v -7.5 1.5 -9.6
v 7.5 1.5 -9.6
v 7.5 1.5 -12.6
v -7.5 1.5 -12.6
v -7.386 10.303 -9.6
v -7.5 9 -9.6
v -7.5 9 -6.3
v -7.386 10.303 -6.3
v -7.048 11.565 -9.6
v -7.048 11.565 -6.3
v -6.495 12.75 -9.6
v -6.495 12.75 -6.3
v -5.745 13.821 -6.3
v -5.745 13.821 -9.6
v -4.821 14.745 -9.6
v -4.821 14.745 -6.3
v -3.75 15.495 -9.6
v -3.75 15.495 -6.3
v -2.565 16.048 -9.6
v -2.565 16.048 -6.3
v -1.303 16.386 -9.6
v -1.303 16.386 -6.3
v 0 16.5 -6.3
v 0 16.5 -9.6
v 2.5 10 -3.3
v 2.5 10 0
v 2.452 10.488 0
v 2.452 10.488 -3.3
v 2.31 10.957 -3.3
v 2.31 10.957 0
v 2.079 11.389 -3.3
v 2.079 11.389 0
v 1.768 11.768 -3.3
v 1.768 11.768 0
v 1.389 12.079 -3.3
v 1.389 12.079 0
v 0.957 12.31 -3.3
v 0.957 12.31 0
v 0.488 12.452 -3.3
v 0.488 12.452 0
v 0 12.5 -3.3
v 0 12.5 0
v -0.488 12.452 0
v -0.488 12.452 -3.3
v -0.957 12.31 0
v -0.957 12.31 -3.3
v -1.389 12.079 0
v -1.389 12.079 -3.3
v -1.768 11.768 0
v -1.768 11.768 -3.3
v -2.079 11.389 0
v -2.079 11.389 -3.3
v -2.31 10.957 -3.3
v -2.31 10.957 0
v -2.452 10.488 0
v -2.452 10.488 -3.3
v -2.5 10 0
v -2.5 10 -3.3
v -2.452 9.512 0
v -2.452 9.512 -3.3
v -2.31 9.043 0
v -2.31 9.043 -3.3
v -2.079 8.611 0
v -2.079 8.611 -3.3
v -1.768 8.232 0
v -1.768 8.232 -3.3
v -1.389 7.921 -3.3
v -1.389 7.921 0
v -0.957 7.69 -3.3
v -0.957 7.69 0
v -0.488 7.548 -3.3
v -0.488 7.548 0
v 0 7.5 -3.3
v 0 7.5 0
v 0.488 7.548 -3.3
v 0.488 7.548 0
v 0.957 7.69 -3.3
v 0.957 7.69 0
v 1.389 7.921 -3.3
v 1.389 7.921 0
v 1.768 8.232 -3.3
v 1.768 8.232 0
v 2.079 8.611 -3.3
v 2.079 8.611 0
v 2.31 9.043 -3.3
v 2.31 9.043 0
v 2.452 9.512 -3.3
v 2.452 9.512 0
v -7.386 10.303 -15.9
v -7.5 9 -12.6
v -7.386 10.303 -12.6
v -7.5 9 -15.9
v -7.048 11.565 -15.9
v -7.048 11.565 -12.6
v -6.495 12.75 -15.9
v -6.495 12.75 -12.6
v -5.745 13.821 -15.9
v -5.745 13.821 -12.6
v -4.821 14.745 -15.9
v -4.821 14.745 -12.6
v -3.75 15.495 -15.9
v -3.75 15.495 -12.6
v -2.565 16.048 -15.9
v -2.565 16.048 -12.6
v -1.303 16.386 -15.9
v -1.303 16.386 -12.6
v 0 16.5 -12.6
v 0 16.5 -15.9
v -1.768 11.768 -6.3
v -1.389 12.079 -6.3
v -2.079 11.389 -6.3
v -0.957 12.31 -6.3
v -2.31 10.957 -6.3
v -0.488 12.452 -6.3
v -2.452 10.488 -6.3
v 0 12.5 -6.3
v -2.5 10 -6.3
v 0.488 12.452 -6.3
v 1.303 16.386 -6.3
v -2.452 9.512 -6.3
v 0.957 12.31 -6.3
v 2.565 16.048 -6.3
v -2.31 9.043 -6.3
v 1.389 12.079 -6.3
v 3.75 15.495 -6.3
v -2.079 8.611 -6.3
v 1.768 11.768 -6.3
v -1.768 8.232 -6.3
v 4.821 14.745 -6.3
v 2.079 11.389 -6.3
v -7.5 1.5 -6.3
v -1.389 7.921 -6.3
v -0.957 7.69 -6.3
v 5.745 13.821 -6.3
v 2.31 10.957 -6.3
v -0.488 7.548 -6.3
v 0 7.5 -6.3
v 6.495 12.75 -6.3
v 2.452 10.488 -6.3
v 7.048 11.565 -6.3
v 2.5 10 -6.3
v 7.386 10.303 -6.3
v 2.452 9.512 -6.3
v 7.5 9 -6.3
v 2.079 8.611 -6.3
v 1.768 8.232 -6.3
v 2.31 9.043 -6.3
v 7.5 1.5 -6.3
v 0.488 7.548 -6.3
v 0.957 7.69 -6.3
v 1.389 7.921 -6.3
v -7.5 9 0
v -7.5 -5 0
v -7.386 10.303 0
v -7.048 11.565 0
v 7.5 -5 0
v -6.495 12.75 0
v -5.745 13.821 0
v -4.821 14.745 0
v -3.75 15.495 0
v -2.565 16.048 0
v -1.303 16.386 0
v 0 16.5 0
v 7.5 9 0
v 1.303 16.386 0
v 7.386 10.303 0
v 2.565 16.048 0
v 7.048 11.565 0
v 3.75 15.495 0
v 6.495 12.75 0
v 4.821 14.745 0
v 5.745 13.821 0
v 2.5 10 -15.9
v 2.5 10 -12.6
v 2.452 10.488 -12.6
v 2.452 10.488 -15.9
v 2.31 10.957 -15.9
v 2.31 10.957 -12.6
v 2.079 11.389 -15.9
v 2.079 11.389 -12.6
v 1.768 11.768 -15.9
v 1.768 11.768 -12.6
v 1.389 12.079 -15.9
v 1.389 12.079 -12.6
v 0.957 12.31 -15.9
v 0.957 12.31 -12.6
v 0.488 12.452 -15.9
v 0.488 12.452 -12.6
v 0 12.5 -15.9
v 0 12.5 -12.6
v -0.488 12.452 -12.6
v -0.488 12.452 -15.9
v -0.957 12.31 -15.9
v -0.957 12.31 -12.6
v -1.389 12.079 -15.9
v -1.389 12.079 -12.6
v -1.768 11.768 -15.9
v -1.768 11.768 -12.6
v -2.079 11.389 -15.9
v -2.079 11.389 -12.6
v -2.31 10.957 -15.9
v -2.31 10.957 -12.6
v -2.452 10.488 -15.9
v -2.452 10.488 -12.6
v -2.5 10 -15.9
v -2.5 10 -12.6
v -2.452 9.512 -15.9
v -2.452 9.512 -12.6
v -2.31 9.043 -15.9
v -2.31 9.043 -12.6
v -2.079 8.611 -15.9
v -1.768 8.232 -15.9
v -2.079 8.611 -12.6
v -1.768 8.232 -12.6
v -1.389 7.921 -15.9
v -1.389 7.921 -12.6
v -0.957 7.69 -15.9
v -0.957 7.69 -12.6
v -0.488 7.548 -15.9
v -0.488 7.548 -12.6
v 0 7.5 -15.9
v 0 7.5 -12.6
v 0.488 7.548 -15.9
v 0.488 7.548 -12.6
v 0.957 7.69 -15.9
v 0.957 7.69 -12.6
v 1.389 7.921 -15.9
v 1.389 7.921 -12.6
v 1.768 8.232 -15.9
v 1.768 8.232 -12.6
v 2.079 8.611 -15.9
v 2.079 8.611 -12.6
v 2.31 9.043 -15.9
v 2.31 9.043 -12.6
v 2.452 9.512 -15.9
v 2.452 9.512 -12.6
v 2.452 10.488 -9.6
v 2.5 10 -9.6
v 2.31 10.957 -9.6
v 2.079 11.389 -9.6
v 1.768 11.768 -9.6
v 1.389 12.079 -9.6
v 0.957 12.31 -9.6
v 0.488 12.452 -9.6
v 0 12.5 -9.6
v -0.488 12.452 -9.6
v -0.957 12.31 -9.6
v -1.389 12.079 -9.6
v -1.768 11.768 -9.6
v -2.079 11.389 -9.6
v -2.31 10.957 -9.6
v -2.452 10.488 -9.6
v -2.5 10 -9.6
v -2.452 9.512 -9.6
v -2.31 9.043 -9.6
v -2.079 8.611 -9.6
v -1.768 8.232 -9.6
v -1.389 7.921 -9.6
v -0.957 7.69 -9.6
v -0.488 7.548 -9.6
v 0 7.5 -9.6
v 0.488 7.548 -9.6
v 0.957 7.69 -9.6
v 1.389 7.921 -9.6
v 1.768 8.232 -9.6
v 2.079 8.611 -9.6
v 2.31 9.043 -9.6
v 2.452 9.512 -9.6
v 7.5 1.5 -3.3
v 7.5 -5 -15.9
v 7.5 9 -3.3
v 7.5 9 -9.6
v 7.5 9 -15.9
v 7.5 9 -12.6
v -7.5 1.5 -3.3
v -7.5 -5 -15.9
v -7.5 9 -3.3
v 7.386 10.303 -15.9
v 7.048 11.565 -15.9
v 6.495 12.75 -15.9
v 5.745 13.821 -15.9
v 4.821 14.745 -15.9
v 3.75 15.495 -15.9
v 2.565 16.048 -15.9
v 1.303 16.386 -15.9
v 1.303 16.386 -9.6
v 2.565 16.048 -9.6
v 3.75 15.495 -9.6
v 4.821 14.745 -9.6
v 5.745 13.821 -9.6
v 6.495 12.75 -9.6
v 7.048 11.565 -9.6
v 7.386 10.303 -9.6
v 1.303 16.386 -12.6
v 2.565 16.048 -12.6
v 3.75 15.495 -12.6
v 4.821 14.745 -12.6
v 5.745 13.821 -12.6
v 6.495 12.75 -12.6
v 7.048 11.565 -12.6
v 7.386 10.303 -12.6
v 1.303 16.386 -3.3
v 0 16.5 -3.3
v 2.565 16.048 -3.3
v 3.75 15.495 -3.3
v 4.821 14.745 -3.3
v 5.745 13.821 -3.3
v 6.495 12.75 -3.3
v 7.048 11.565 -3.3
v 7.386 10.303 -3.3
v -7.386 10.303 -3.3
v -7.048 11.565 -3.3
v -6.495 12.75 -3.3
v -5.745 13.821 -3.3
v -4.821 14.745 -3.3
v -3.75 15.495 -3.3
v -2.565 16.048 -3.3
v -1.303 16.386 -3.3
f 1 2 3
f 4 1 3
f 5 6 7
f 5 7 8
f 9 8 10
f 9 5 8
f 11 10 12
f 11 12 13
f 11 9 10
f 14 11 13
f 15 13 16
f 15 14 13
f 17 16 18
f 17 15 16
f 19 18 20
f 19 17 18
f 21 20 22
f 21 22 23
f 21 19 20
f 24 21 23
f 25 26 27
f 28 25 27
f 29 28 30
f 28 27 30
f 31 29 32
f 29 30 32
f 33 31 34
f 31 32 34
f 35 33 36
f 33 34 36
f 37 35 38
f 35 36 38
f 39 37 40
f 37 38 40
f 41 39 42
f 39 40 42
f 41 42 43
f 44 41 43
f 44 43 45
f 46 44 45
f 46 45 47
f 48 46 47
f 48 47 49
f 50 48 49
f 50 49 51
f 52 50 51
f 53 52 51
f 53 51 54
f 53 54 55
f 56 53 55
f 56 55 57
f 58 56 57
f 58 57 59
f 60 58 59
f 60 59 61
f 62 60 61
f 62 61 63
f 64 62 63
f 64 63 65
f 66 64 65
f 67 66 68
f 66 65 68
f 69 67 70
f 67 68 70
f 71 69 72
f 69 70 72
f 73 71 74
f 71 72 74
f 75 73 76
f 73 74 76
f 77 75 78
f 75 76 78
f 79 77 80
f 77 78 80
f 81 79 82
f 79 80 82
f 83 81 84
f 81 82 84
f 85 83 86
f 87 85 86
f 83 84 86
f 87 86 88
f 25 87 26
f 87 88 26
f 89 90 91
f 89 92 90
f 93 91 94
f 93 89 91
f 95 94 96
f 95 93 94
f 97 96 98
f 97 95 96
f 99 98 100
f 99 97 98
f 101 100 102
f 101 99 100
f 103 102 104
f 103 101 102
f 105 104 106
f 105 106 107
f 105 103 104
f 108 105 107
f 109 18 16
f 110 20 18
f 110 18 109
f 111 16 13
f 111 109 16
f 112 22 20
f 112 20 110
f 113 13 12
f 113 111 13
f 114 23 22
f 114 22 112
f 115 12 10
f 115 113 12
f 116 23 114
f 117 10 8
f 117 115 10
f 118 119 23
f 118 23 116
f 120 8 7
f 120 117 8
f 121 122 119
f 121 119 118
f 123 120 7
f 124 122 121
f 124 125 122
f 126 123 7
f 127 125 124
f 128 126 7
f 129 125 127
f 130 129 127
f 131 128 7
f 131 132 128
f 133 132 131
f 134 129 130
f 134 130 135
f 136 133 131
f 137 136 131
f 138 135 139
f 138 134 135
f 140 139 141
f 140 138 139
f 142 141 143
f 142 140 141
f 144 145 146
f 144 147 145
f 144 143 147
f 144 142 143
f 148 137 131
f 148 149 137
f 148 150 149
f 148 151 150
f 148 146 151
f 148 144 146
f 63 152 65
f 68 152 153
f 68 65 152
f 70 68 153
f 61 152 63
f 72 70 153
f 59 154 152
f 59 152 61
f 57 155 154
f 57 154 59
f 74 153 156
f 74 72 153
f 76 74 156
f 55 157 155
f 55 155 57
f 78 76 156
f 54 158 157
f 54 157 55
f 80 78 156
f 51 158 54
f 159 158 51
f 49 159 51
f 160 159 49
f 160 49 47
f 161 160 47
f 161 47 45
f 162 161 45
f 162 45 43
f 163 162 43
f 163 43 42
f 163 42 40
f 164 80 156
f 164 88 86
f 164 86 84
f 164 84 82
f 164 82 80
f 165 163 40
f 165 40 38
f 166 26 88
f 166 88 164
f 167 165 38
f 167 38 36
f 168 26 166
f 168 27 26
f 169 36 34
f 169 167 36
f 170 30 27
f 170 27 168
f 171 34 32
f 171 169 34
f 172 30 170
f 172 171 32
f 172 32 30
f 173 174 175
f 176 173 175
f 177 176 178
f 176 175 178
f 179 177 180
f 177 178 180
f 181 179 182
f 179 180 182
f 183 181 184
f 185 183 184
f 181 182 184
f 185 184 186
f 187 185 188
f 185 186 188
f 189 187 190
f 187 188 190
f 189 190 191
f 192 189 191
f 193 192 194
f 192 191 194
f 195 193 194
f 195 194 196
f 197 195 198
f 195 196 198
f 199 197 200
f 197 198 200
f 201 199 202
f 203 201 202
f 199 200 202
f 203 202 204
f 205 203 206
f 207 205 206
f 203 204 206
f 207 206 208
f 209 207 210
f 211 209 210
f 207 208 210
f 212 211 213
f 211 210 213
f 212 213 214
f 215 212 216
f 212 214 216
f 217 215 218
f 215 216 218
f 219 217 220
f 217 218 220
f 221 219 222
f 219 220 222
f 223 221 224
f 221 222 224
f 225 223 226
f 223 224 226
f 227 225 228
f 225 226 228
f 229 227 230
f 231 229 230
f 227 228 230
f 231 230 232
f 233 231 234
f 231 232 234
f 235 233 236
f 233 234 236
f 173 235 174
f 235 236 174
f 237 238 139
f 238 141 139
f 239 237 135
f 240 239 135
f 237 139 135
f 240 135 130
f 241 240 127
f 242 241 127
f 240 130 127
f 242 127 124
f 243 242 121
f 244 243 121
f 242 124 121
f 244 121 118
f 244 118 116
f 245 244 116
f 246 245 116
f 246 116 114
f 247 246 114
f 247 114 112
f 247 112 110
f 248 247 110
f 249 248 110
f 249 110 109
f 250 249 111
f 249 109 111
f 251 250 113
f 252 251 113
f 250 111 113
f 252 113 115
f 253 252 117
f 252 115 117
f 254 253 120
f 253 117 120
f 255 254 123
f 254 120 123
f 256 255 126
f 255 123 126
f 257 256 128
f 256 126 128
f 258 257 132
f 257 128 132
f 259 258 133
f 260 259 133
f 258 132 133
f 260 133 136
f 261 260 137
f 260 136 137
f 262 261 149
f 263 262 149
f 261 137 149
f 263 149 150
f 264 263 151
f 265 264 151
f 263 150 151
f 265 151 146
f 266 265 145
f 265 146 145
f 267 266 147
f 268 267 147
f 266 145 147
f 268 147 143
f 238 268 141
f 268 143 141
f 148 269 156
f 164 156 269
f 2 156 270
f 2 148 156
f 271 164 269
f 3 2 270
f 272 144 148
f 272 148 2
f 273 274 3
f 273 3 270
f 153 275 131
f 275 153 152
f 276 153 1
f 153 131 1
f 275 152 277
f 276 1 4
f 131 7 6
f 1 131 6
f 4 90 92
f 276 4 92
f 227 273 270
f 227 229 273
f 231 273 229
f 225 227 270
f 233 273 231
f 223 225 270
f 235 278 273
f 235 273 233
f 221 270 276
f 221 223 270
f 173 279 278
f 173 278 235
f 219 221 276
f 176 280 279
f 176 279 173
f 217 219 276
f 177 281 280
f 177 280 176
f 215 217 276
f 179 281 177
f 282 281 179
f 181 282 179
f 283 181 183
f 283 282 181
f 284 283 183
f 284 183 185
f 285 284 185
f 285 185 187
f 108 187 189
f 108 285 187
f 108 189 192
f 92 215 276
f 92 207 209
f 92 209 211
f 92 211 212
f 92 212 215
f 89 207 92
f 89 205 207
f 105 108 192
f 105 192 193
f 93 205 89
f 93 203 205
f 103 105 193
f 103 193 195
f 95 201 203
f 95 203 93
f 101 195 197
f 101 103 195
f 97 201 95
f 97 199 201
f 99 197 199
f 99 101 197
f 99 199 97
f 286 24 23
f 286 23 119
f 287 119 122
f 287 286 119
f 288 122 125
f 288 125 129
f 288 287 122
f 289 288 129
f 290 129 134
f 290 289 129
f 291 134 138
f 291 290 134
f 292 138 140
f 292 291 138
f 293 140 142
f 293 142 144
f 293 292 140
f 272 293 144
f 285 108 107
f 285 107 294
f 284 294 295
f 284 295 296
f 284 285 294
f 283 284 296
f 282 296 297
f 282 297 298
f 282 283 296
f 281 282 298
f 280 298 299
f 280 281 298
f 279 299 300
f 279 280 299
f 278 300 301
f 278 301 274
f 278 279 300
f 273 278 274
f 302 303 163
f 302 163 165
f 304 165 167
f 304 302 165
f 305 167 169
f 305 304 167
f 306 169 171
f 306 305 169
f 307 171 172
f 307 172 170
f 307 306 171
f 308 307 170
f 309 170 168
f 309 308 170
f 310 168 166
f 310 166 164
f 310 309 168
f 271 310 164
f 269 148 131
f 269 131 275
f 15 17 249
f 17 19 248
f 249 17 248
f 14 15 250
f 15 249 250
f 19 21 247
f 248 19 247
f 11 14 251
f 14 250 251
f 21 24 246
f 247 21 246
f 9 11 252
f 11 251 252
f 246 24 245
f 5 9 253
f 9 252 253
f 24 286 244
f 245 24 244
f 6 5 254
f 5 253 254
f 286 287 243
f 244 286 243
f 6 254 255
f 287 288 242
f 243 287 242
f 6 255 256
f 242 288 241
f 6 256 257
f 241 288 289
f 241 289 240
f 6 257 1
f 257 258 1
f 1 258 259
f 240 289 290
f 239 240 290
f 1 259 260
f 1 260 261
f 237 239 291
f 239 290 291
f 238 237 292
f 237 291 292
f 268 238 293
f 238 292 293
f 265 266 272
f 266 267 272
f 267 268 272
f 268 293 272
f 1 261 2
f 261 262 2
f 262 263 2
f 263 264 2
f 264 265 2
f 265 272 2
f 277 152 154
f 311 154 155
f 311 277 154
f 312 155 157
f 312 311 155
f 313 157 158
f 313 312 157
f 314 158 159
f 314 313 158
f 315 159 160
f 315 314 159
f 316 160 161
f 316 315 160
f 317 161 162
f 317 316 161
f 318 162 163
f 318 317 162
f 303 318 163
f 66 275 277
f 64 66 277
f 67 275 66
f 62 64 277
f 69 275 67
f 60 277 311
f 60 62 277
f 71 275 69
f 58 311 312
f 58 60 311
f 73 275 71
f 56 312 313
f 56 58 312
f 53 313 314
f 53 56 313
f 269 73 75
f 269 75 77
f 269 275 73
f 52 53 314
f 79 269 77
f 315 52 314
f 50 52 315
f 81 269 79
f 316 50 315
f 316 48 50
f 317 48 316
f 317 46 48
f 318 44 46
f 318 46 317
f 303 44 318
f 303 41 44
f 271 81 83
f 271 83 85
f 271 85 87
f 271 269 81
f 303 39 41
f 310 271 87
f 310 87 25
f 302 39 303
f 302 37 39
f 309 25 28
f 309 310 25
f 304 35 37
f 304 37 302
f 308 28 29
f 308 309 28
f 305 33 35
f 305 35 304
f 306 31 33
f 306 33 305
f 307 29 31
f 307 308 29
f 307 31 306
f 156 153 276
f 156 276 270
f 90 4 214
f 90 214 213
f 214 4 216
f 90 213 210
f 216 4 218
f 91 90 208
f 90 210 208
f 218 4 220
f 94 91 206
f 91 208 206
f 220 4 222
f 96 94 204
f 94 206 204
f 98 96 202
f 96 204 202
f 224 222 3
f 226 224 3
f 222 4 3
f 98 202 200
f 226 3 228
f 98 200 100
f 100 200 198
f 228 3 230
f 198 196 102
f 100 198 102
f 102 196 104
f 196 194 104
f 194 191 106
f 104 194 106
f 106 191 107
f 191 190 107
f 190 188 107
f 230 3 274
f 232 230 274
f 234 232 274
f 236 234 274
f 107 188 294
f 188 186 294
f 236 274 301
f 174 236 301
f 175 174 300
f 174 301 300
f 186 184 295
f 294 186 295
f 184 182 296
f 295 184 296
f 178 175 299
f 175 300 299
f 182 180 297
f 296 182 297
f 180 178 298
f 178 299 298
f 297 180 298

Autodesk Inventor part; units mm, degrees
ref_plane "YZ Plane" through (0, 0, 0) normal (1, 0, 0) x (0, 1, 0)
ref_plane "XZ Plane" through (0, 0, 0) normal (0, 1, 0) x (-1, 0, 0)
ref_plane "XY Plane" through (0, 0, 0) normal (0, 0, 1) x (1, 0, 0)
sketch "Sketch4" plane through (0, 0, 0) normal (0, 0, 1) x (1, 0, 0)
  line L0 (-10.5, 0) -> (10.5, 0) projected
  line L1 (0, -3.3) -> (0, 19.8) projected
  line L2 (-7.5, 0) -> (7.5, 0)
  line L3 (7.5, 0) -> (7.5, 16.5)
  line L4 (7.5, 16.5) -> (-7.5, 16.5)
  line L5 (-7.5, 16.5) -> (-7.5, 0)
  circle A0 centre (0, 10) radius 2.5
  point P0 (0, 0)
  dimension "d0" = 7.5
  dimension "d1" = 7.5
  dimension "d2" = 16.5
  dimension "d3" = 5
  dimension "d4" = 6.5
extrude "Extrusion1" add sketch "Sketch4" against normal blind 15.9 contours L5 L4 L1 A0 L0 | L1 A0 L4 L3 L0
fillet "Fillet1" radius 7.5 2 edges at (7.5, 16.5, -7.95) (-7.5, 16.5, -7.95)
sketch "Sketch5" plane through (-7.5, 0, 0) normal (0, -1, 0) x (1, 0, 0)
  line L0 (0, 0) -> (0, -15.9) projected
  line L1 (15, 0) -> (15, -15.9) projected
  line L2 (0, 0) -> (15, 0)
  line L3 (15, 0) -> (15, -15.9)
  line L4 (15, -15.9) -> (0, -15.9)
  line L5 (0, -15.9) -> (0, 0)
  point P0 (7.5, 0)
extrude "Extrusion2" add sketch "Sketch5" along normal blind 5
sketch "Sketch6" plane through (7.5, 9, 0) normal (1, 0, 0) x (0, 0, -1)
  point P0 (0, -9)
sketch "Sketch7" plane through (7.5, 9, 0) normal (1, 0, 0) x (0, 0, -1)
  line L0 (0, 0) -> (0, 7.5) projected
  line L1 (0, 7.5) -> (3.3, 7.5)
  line L2 (3.3, 7.5) -> (3.3, -7.5)
  line L3 (3.3, -7.5) -> (0, -7.5)
  line L4 (0, -7.5) -> (0, 7.5)
  line L5 (0, 7.5) -> (15.9, 7.5) projected
  line L6 (6.3, 7.5) -> (9.6, 7.5)
  line L7 (9.6, 7.5) -> (9.6, -7.5)
  line L8 (9.6, -7.5) -> (6.3, -7.5)
  line L9 (6.3, -7.5) -> (6.3, 7.5)
  line L10 (12.6, 7.5) -> (15.9, 7.5)
  line L11 (15.9, 7.5) -> (15.9, -7.5)
  line L12 (15.9, -7.5) -> (12.6, -7.5)
  line L13 (12.6, -7.5) -> (12.6, 7.5)
  line L14 (3.3, -7.5) -> (6.3, -7.5)
  line L15 (9.6, -7.5) -> (12.6, -7.5)
  line L16 (3.3, 7.5) -> (6.3, 7.5)
  line L17 (9.6, 7.5) -> (12.6, 7.5)
  point P0 (0, -9)
  dimension "d10" = 3.3
  dimension "d11" = 15
  dimension "d12" = 3
  dimension "d13" = 3.3
  dimension "d14" = 3
  dimension "d15" = 3.3
sketch "Sketch8" plane through (7.5, 9, 0) normal (1, 0, 0) x (0, 0, -1)
  line L0 (0, 7.5) -> (15.9, 7.5) projected
  line L1 (3.3, 7.5) -> (6.2995, 7.5)
  line L2 (6.2995, 7.5) -> (6.2995, -7.4999)
  line L3 (6.2995, -7.4999) -> (3.3, -7.4999)
  line L4 (3.3, -7.4999) -> (3.3, 7.5)
  line L5 (9.5994, 7.5) -> (12.5997, 7.5)
  line L6 (12.5997, 7.5) -> (12.5997, -7.4999)
  line L7 (12.5997, -7.4999) -> (9.5994, -7.4999)
  line L8 (9.5994, -7.4999) -> (9.5994, 7.5)
  point P0 (0, -9)
extrude "Extrusion3" cut sketch "Sketch7" against normal through all contours L5 L13 L15 L7
extrude "Extrusion4" cut sketch "Sketch8" against normal through all contours L0 L2 L3 L4
properties part number "gopro_base"
